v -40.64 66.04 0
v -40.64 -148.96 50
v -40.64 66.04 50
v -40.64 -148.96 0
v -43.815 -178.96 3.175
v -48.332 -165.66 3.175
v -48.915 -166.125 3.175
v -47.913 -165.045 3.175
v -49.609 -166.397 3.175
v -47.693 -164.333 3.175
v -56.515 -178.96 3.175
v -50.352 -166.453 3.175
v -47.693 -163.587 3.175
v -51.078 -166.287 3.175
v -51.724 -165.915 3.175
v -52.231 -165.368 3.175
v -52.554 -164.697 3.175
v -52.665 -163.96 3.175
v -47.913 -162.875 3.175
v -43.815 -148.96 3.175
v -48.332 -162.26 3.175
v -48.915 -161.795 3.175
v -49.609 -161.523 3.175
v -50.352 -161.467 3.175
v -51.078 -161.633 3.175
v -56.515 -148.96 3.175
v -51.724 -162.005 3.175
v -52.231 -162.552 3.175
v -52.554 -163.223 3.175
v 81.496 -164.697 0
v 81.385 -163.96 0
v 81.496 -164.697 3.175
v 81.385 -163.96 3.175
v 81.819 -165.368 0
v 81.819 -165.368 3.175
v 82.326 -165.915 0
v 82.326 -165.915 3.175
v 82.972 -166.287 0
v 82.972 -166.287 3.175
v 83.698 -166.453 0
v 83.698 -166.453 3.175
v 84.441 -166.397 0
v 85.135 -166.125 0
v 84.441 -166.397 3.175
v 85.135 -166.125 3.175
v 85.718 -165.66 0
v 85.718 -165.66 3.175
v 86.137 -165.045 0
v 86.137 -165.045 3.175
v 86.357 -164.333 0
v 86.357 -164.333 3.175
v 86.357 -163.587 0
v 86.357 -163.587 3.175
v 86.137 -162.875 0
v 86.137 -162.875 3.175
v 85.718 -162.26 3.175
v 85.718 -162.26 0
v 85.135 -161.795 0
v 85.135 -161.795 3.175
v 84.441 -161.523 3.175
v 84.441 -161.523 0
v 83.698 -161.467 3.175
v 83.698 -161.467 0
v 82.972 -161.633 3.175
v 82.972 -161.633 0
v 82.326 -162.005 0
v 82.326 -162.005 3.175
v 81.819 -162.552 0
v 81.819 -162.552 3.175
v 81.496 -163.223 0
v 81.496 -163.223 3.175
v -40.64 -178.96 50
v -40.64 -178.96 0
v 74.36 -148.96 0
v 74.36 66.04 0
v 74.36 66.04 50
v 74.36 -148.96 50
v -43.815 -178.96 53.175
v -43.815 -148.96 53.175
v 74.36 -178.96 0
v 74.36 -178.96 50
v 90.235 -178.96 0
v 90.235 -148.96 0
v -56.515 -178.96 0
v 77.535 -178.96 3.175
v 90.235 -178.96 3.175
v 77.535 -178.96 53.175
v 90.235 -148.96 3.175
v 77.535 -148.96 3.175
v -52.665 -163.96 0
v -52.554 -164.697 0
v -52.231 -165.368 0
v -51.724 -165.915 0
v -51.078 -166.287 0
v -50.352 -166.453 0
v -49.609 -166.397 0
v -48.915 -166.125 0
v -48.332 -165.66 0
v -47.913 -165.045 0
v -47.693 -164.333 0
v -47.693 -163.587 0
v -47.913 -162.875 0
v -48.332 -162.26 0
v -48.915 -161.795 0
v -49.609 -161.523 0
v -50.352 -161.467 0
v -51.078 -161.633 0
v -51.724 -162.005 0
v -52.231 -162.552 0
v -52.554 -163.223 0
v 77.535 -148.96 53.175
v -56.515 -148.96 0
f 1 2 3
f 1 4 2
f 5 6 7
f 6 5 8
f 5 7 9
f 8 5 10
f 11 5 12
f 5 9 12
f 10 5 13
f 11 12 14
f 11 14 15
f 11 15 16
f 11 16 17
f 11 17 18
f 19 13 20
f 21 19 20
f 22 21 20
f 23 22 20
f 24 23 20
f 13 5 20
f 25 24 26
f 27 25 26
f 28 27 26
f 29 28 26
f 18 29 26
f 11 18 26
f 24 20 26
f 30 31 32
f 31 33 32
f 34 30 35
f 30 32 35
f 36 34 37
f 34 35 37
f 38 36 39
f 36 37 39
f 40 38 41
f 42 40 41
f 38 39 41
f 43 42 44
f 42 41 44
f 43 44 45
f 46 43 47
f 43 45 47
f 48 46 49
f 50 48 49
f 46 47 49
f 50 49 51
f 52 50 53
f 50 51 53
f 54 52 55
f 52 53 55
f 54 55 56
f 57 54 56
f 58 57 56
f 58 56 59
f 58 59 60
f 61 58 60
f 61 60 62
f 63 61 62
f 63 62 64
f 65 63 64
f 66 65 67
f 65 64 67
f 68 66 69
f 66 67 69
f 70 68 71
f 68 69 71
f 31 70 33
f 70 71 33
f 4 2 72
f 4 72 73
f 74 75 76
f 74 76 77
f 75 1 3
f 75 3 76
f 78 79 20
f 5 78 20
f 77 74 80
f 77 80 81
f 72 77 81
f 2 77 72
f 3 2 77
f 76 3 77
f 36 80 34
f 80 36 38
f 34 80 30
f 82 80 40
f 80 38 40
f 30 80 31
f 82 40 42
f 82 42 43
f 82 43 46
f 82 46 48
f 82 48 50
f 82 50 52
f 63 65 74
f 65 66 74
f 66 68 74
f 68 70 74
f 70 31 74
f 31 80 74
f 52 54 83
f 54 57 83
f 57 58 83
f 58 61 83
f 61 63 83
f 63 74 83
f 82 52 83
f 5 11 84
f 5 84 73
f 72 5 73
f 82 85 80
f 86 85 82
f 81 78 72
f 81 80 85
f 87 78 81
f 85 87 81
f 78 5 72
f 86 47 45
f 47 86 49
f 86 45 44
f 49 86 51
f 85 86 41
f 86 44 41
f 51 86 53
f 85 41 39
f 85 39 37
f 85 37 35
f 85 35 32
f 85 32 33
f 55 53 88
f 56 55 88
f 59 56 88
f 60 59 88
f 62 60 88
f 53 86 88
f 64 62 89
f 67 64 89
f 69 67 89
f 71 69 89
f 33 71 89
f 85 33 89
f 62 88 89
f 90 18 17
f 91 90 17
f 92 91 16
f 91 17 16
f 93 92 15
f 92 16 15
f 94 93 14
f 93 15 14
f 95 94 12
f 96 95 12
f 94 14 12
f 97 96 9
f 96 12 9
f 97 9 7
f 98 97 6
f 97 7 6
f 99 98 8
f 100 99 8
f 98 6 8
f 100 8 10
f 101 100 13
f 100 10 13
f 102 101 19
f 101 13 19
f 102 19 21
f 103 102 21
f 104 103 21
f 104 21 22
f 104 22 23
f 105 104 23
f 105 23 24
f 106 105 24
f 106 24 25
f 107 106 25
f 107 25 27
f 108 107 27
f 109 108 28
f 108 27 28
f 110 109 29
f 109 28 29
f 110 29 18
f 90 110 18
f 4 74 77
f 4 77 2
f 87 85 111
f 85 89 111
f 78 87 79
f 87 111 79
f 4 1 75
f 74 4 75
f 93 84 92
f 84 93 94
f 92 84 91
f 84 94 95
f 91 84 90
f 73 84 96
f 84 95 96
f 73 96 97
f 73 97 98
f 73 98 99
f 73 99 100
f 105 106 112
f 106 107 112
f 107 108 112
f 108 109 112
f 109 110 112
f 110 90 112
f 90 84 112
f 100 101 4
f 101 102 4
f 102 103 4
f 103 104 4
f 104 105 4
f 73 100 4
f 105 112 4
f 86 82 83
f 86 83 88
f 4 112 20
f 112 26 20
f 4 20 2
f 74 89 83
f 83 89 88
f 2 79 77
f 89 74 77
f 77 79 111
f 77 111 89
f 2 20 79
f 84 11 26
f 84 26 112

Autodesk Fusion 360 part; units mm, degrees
sketch "Sketch1" plane through (0, 0, 0) normal (0, 0, 1) x (1, 0, 0) in component "PSU"
  line L0 (-40.64, 66.04) -> (74.36, 66.04)
  line L1 (74.36, 66.04) -> (74.36, -148.96)
  line L2 (74.36, -148.96) -> (-40.64, -148.96)
  line L3 (-40.64, -148.96) -> (-40.64, 66.04)
  dimension "d1" = 115
  dimension "d2" = 215
extrude "Extrude1" add sketch "Sketch1" along normal blind 50 makes body 1 in component "PSU"
sketch "Sketch1 (2)" plane through (0, -148.96, 0) normal (0, -1, 0) x (1, 0, 0) in component "Bracket"
  line L0 (-40.64, 0) -> (74.36, 0)
  line L1 (74.36, 0) -> (74.36, 50)
  line L2 (74.36, 50) -> (-40.64, 50)
  line L3 (-40.64, 50) -> (-40.64, 0)
  line L4 (-56.515, 0) -> (-40.64, 0)
  line L5 (-40.64, 50) -> (74.36, 50)
  line L6 (74.36, 0) -> (90.235, 0)
  line L7 (90.235, 0) -> (90.235, 3.175)
  line L8 (90.235, 3.175) -> (77.535, 3.175)
  line L9 (77.535, 3.175) -> (77.535, 53.175)
  line L10 (77.535, 53.175) -> (-43.815, 53.175)
  line L11 (-43.815, 53.175) -> (-43.815, 3.175)
  line L12 (-43.815, 3.175) -> (-56.515, 3.175)
  line L13 (-56.515, 3.175) -> (-56.515, 0)
  dimension "d5" = 3.175
  dimension "d6" = 3.175
  dimension "d7" = 12.7
  dimension "d8" = 3.175
  dimension "d9" = 3.175
  dimension "d10" = 3.175
  dimension "d11" = 12.7
extrude "Extrude1'" add sketch "Sketch1 (2)" along normal blind 30 separate body contours L1 L2 L3 L4 L5 L6 L7 L8 L9 L10 L11 L12 L13 makes body 2 in component "Bracket"
sketch "Sketch2" plane through (0, 0, 3.175) normal (0, 0, 1) x (-1, 0, 0) in component "Bracket"
  line L0 (43.815, 148.96) -> (56.515, 148.96)
  line L1 (56.515, 148.96) -> (56.515, 178.96)
  line L2 (56.515, 178.96) -> (43.815, 178.96)
  line L3 (43.815, 178.96) -> (43.815, 148.96)
  circle A0 centre (50.165, 163.96) radius 2.5
  circle A1 centre (-83.885, 163.96) radius 2.5
  line L4 (-90.235, 148.96) -> (-90.235, 178.96)
  line L5 (-90.235, 148.96) -> (-77.535, 148.96)
  dimension "d14" = 5
  dimension "d15" = 15
  dimension "d16" = 6.35
  dimension "d17" = 6.35
  dimension "d18" = 15
  dimension "d19" = 5
extrude "Extrude1''" cut sketch "Sketch2" against normal through all contours A0 | A1 bodies 2 in component "Bracket"
component "PSU" placed x (1, 0, 0) y (0, 1, 0) z (0, 0, 1) at (0, 0, 0)
component "Bracket" placed x (1, 0, 0) y (0, 1, 0) z (0, 0, 1) at (0, 0, 0)
